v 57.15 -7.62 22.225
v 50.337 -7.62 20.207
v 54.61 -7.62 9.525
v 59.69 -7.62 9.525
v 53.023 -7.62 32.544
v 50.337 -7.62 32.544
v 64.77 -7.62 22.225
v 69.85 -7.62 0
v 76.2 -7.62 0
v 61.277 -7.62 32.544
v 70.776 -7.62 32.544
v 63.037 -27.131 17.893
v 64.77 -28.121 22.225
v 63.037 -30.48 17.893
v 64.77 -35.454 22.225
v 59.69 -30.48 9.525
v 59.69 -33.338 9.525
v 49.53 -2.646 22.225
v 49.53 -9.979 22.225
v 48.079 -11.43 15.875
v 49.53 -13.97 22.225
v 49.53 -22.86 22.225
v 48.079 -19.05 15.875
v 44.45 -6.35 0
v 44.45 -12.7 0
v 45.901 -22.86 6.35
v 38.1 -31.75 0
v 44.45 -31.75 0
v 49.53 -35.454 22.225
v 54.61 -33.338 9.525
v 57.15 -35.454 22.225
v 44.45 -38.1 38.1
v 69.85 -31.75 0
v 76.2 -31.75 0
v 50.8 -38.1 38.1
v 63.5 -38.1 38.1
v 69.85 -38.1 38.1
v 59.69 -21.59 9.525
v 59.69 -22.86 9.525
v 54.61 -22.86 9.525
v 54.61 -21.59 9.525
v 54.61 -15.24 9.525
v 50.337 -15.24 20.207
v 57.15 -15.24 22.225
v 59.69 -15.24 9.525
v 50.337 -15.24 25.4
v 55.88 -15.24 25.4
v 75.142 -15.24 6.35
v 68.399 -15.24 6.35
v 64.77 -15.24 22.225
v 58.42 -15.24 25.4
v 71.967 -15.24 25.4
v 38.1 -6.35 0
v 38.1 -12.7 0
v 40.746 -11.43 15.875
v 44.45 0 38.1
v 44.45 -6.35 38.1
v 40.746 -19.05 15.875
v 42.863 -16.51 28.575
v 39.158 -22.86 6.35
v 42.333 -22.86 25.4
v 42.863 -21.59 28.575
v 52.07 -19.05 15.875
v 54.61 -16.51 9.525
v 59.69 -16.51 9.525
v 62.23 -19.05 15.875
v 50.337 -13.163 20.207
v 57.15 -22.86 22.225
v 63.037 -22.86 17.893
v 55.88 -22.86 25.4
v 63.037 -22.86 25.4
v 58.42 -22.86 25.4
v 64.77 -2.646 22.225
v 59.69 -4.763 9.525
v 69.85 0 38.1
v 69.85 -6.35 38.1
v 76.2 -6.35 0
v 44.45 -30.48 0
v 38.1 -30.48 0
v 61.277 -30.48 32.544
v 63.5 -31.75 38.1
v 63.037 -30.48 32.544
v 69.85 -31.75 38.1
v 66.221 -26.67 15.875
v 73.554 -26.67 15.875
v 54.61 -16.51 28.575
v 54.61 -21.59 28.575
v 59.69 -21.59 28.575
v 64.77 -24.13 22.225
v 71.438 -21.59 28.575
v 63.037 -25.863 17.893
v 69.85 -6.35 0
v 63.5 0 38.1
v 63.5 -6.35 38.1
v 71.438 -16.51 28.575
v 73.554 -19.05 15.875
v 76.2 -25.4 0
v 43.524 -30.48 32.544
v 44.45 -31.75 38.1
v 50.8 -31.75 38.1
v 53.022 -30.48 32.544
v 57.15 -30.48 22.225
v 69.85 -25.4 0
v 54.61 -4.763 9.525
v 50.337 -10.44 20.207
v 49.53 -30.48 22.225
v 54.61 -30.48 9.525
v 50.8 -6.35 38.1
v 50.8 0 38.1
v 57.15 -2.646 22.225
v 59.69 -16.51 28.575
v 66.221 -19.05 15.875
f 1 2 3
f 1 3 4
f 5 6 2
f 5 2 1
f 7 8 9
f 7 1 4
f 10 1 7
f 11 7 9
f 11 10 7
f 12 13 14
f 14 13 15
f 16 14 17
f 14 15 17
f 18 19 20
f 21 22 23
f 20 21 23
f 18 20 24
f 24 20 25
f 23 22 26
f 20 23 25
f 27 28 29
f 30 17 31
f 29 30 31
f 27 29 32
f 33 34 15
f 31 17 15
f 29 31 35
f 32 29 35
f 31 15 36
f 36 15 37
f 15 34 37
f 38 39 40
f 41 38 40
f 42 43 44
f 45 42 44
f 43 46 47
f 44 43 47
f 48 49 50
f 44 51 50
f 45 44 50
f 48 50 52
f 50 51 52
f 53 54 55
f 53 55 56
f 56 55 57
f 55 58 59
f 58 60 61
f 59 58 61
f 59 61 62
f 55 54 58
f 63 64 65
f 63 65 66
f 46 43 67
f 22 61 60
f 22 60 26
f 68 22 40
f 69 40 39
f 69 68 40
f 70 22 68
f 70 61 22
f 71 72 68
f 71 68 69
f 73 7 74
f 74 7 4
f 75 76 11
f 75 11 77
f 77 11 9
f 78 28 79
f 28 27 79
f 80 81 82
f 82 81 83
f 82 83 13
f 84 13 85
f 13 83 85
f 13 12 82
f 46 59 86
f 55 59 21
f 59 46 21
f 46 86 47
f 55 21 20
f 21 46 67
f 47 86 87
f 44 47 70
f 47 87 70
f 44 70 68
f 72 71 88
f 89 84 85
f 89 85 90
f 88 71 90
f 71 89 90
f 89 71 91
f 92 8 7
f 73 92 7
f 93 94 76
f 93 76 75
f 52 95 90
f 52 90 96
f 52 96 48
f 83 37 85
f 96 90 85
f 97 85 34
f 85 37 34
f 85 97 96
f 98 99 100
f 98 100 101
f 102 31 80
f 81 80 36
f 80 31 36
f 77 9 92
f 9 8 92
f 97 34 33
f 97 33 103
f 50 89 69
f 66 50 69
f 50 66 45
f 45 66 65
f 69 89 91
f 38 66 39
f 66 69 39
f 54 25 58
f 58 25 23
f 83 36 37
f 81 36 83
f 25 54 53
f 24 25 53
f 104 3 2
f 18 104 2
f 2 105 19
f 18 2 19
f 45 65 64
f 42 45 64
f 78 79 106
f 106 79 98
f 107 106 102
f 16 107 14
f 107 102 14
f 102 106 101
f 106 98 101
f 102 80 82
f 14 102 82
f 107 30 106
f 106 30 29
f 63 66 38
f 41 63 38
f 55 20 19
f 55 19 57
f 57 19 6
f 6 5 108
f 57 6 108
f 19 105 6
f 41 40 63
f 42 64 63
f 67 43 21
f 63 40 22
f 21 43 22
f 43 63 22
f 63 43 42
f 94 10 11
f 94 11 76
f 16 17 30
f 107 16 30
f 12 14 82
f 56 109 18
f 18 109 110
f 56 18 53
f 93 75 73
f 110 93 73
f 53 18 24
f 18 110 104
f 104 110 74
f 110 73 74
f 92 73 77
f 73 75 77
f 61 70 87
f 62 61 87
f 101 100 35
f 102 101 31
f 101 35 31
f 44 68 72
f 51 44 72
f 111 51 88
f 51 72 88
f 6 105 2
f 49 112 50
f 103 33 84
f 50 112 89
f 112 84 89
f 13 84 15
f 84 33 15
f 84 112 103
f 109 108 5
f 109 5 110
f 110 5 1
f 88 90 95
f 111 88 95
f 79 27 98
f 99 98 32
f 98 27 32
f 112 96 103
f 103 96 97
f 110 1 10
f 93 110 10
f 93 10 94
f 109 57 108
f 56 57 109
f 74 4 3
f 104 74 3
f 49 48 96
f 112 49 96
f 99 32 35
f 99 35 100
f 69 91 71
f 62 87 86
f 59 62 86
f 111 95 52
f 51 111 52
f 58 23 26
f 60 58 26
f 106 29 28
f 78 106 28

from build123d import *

# Parameters (mm, degrees)
F0_W      = 38.1
F0_H      = 38.1
F1_DEPTH  = 38.1
F5_W      = 38.1
F5_H      = 38.1
F6_DEPTH  = 38.1
F1_FACE_W = 38.1
F1_FACE_H = 38.1
F8_DEPTH  = 38.1
F9_DEPTH  = 38.1
F11_DEPTH = 38.1
F13_W     = 28.973644
F13_H     = 7.62
F13_W_2   = 31.493082
F14_DEPTH = 38.1


with BuildPart() as f1:
    # F0 (on Front) → F1 (new body)
    with BuildSketch(Plane.XZ):
        with Locations((19.05, 19.05)):
            Rectangle(F0_W, F0_H)
    extrude(amount=F1_DEPTH)

    # F5 (on offset) → F6 (join)
    with BuildSketch(Plane.YZ.offset(38.1)):
        with Locations((-19.05, 19.05)):
            Rectangle(F5_W, F5_H)
    extrude(amount=F6_DEPTH)

    # F1_face (on face) → F8 (cut)
    with BuildSketch(Plane(origin=(0, -19.05, 19.05), x_dir=(0, -1, 0), z_dir=(-1, 0, 0))):
        Rectangle(F1_FACE_W, F1_FACE_H)
    extrude(amount=-F8_DEPTH, mode=Mode.SUBTRACT)

    # F7 (on face) → F9 (cut)
    with BuildSketch(Plane.YZ.offset(76.2)):
        Polygon((-6.35, 38.1), (-31.75, 38.1), (-26.67, 15.875), (-21.59, 28.575), (-16.51, 28.575), (-11.43, 15.875), align=None)
        Polygon((-19.05, 15.875), (-25.4, 0), (-12.7, 0), align=None)
        Polygon((0, 0), (0, 38.1), (-6.35, 0), align=None)
        Polygon((-31.75, 0), (-38.1, 38.1), (-38.1, 0), align=None)
    extrude(amount=-F9_DEPTH, mode=Mode.SUBTRACT)

    # F10 (on offset) → F11 (cut)
    with BuildSketch(Plane.XZ.offset(38.1)):
        Polygon((63.5, 38.1), (50.8, 38.1), (57.15, 22.225), align=None)
        Polygon((49.53, 22.225), (44.45, 0), (69.85, 0), (64.77, 22.225), (59.69, 9.525), (54.61, 9.525), align=None)
        Polygon((69.85, 38.1), (76.2, 0), (76.2, 38.1), align=None)
        Polygon((38.1, 38.1), (38.1, 0), (44.45, 38.1), align=None)
    extrude(amount=-F11_DEPTH, mode=Mode.SUBTRACT)

    # F13 (on face) → F14 (cut)
    with BuildSketch(Plane.XY.offset(38.1)):
        with Locations((64.823925, -11.43)):
            Rectangle(F13_W, F13_H)
        with Locations((47.290562, -26.67)):
            Rectangle(F13_W_2, F13_H)
    extrude(amount=-F14_DEPTH, mode=Mode.SUBTRACT)


solid = f1.part
